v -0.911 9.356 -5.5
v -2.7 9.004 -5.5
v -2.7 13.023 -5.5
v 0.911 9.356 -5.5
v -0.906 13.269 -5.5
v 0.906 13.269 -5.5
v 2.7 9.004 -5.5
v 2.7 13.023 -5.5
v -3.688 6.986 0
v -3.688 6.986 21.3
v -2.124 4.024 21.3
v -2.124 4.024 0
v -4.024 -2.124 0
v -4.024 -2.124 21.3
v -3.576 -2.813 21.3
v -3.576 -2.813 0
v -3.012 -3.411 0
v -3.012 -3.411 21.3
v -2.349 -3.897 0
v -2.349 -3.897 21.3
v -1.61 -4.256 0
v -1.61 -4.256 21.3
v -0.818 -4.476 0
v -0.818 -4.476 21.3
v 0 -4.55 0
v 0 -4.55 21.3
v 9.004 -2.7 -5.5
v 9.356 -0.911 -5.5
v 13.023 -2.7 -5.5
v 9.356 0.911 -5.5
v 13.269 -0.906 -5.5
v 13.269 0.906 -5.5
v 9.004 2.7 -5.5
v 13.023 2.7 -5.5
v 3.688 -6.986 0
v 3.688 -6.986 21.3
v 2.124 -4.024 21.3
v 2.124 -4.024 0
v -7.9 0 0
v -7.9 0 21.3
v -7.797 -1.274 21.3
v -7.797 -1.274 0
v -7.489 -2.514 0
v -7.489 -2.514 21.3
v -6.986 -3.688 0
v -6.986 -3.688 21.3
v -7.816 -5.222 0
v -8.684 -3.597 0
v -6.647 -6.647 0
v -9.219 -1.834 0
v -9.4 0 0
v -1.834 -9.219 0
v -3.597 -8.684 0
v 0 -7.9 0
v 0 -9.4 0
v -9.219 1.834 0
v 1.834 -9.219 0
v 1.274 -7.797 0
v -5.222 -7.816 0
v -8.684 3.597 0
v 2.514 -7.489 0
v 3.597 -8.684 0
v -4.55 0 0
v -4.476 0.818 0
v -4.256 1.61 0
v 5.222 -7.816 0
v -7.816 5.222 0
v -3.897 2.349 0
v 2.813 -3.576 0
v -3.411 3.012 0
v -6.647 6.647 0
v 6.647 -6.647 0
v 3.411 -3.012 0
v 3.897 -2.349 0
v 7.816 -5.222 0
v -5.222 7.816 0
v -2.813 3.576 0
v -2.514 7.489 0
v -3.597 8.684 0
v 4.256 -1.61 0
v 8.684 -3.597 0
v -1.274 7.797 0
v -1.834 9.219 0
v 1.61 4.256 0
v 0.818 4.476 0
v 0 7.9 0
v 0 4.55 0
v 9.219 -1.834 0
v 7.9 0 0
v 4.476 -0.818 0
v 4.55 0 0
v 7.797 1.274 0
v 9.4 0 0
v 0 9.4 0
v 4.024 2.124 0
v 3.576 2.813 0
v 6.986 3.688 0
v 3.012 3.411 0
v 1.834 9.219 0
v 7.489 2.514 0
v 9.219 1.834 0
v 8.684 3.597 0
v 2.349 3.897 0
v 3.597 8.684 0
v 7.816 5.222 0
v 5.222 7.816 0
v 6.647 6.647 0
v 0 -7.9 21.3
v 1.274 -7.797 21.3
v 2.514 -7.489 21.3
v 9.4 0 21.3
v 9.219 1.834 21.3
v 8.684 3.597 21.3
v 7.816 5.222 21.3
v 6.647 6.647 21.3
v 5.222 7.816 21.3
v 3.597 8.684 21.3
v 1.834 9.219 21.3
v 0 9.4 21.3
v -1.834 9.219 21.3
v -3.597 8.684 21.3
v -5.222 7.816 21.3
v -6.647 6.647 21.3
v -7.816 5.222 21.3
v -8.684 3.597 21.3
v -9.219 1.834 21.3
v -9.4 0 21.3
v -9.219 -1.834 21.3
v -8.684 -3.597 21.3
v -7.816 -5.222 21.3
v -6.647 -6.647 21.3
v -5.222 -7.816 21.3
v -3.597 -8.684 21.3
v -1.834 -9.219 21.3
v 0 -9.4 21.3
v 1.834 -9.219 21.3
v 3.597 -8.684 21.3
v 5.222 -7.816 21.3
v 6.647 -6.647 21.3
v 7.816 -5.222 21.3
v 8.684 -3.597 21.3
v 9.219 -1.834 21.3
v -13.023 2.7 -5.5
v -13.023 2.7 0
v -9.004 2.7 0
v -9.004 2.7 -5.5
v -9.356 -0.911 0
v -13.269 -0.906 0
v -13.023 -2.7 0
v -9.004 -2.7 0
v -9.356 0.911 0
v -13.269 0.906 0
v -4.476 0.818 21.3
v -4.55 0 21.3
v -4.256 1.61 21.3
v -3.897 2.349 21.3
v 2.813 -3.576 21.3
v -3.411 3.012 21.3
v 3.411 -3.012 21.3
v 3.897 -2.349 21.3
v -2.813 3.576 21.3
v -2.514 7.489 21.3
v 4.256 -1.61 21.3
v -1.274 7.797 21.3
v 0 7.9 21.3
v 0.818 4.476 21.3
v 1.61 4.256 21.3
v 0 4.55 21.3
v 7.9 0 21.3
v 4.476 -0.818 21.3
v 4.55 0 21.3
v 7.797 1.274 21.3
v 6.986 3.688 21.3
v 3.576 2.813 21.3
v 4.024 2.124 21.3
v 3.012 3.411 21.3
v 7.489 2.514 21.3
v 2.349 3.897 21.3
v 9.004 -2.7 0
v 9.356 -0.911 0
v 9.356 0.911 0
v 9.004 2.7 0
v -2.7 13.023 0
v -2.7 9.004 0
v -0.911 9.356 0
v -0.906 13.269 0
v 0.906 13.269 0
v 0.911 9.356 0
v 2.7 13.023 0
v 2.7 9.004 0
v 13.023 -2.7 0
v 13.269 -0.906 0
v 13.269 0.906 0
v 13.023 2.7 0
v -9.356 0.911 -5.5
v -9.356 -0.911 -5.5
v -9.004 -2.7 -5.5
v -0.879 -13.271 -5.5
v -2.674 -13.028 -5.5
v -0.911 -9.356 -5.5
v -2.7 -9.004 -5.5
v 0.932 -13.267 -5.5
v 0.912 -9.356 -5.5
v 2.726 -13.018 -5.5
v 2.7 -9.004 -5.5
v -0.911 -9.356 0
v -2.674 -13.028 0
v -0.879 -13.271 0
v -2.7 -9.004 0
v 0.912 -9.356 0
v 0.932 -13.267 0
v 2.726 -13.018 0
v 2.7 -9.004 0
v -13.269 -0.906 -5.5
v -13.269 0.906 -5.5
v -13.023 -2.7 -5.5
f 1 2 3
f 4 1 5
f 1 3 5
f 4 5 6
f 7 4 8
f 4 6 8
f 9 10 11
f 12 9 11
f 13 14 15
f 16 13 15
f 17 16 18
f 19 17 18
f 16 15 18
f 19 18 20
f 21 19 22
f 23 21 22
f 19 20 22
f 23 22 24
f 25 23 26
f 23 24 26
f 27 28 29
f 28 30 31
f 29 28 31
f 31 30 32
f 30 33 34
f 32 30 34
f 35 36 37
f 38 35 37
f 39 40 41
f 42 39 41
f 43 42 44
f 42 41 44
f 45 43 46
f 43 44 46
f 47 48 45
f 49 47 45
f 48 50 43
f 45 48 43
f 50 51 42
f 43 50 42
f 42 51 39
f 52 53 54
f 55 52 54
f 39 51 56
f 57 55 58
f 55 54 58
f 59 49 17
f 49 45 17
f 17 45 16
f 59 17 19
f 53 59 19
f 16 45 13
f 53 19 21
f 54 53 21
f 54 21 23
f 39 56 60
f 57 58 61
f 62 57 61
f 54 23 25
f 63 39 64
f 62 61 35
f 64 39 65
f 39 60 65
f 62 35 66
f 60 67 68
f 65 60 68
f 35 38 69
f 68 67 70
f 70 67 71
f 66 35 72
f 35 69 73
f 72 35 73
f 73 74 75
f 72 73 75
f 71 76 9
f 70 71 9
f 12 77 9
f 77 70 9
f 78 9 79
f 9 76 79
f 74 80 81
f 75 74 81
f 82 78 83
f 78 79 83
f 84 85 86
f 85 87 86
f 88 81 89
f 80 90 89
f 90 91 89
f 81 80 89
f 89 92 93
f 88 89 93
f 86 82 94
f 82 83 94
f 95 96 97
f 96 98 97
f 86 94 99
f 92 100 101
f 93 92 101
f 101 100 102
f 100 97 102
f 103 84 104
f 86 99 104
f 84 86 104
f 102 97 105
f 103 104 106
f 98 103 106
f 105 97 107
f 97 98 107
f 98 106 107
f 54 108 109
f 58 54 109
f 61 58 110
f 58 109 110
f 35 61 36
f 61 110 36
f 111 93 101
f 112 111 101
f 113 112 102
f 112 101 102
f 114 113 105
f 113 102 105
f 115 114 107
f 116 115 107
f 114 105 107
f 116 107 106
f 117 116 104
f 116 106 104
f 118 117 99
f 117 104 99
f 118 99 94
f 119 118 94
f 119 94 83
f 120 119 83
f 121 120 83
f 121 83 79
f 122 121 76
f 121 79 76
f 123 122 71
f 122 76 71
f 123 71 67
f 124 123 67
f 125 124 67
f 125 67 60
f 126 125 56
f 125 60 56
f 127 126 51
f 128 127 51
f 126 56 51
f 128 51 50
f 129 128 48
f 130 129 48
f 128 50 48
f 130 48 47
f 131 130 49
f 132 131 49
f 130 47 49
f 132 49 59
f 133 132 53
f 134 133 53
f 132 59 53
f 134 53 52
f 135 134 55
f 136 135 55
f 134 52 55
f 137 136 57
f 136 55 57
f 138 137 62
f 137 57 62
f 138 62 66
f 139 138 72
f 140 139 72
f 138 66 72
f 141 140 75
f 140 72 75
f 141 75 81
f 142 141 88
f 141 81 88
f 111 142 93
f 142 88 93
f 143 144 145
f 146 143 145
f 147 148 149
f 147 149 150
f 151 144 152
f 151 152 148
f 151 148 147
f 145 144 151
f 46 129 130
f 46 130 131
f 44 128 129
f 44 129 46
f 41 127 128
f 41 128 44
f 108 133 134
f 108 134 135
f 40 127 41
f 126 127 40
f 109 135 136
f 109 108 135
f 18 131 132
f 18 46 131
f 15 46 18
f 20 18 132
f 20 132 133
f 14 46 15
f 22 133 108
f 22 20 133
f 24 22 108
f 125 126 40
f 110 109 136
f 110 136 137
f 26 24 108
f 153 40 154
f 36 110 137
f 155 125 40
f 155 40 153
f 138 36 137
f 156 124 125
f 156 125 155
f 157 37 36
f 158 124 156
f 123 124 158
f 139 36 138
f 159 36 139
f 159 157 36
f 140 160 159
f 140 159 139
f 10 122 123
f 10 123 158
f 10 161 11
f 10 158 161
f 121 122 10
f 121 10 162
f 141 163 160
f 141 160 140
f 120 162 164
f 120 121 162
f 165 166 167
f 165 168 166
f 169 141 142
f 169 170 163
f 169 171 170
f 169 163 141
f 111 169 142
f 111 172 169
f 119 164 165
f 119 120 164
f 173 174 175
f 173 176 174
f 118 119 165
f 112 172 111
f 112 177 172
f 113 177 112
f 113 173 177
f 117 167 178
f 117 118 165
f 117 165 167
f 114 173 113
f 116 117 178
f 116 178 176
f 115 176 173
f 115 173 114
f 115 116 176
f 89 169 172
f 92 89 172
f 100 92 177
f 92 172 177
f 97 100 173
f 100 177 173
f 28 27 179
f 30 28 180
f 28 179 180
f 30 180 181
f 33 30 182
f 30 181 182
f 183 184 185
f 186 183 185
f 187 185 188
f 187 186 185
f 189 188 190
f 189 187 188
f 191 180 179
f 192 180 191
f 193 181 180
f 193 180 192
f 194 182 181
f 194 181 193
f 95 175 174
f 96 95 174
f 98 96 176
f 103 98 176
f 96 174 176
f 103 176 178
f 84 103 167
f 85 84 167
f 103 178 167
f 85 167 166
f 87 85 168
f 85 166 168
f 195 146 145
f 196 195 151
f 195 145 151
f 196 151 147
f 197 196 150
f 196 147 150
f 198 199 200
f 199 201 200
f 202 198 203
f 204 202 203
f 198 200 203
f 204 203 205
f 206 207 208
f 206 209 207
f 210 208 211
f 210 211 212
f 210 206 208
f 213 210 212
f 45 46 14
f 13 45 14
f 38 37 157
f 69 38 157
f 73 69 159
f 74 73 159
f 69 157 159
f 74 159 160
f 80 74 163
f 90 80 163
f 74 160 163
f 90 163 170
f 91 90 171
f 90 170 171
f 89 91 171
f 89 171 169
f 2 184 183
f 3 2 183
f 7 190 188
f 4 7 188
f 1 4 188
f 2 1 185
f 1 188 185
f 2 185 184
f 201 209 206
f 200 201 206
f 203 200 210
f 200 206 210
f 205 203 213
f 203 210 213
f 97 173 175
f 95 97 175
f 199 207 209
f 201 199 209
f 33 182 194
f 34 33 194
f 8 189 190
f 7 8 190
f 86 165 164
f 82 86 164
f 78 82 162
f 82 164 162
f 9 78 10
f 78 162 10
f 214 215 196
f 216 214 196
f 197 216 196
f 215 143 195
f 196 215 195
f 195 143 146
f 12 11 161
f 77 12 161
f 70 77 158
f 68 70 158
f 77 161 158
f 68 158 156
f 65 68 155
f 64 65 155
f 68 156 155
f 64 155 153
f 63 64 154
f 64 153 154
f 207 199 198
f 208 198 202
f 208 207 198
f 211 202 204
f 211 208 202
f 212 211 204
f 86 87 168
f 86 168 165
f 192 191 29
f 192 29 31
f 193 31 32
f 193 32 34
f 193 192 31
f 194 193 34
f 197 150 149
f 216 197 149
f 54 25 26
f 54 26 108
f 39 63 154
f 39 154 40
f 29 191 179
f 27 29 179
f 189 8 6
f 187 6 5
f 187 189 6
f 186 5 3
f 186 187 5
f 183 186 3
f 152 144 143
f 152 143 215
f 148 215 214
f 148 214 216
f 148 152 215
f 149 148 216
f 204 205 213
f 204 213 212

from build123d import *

# Parameters (mm, degrees)
F0_R     = 13.3
F0_R_2   = 9.4
F1_DEPTH = 5.5
F2_R     = 9.4
F3_DEPTH = 21.3
F6_DEPTH = 25
F8_DEPTH = 25


with BuildPart() as f1:
    # F0 (on Top) → F1 (new body)
    with BuildSketch(Plane.XY):
        Circle(F0_R)
        Circle(F0_R_2, mode=Mode.SUBTRACT)
    extrude(amount=-F1_DEPTH)

    # F7 (on Top) → F8 (cut)
    with BuildSketch(Plane.XY):
        with BuildLine():
            Line((13.0230564769, -2.7), (9.0038880491, -2.7))
            ThreePointArc((9.0038880491, -2.7), (6.646845526, -6.6467619601), (2.7001131997, -9.003854103))
            Line((2.7001131997, -9.003854103), (2.7261277271, -13.0176122087))
            ThreePointArc((2.7261277271, -13.0176122087), (9.4139514124, -9.3950794997), (13.0230564769, -2.7))
        make_face()
        with BuildLine():
            ThreePointArc((2.7, 9.0038880491), (6.6468037432, 6.6468037432), (9.0038880491, 2.7))
            Line((9.0038880491, 2.7), (13.0230564769, 2.7))
            ThreePointArc((13.0230564769, 2.7), (9.4045201898, 9.4045201898), (2.7, 13.0230564769))
            Line((2.7, 13.0230564769), (2.7, 9.0038880491))
        make_face()
        with BuildLine():
            ThreePointArc((-9.0038880491, 2.7), (-6.6468037432, 6.6468037432), (-2.7, 9.0038880491))
            Line((-2.7, 9.0038880491), (-2.7, 13.0230564769))
            ThreePointArc((-2.7, 13.0230564769), (-9.4045201898, 9.4045201898), (-13.0230564769, 2.7))
            Line((-13.0230564769, 2.7), (-9.0038880491, 2.7))
        make_face()
        with BuildLine():
            Line((-2.6739155322, -13.0284371943), (-2.7, -9.0038880491))
            ThreePointArc((-2.7, -9.0038880491), (-6.6468037432, -6.6468037432), (-9.0038880491, -2.7))
            Line((-9.0038880491, -2.7), (-13.0230564769, -2.7))
            ThreePointArc((-13.0230564769, -2.7), (-9.3950990566, -9.4139318946), (-2.6739155322, -13.0284371943))
        make_face()
    extrude(amount=-F8_DEPTH, mode=Mode.SUBTRACT)


with BuildPart() as f3:
    # F2 (on Top) → F3 (new body)
    with BuildSketch(Plane.XY):
        Circle(F2_R)
    extrude(amount=F3_DEPTH)

    # F5 (on face) → F6 (cut)
    with BuildSketch(Plane.XY.offset(21.3)):
        with BuildLine():
            Line((4.55, 0), (7.9, 0))
            ThreePointArc((7.9, 0), (7.6681158051, 1.9), (6.9860759494, 3.688460767))
            Line((6.9860759494, 3.688460767), (4.0236260215, 2.1243666443))
            ThreePointArc((4.0236260215, 2.1243666443), (2.3491095939, 3.8966888657), (0, 4.55))
            Line((0, 4.55), (0, 7.9))
            ThreePointArc((0, 7.9), (-1.9, 7.6681158051), (-3.688460767, 6.9860759494))
            Line((-3.688460767, 6.9860759494), (-2.1243666443, 4.0236260215))
            ThreePointArc((-2.1243666443, 4.0236260215), (-3.8966888657, 2.3491095939), (-4.55, 0))
            Line((-4.55, 0), (-7.9, 0))
            ThreePointArc((-7.9, 0), (-7.6681158051, -1.9), (-6.9860759494, -3.688460767))
            Line((-6.9860759494, -3.688460767), (-4.0236260215, -2.1243666443))
            ThreePointArc((-4.0236260215, -2.1243666443), (-2.3491095939, -3.8966888657), (0, -4.55))
            Line((0, -4.55), (0, -7.9))
            ThreePointArc((0, -7.9), (1.9, -7.6681158051), (3.688460767, -6.9860759494))
            Line((3.688460767, -6.9860759494), (2.1243666443, -4.0236260215))
            ThreePointArc((2.1243666443, -4.0236260215), (3.8966888657, -2.3491095939), (4.55, 0))
        make_face()
    extrude(amount=-F6_DEPTH, mode=Mode.SUBTRACT)


solid = Compound([f1.part, f3.part])
